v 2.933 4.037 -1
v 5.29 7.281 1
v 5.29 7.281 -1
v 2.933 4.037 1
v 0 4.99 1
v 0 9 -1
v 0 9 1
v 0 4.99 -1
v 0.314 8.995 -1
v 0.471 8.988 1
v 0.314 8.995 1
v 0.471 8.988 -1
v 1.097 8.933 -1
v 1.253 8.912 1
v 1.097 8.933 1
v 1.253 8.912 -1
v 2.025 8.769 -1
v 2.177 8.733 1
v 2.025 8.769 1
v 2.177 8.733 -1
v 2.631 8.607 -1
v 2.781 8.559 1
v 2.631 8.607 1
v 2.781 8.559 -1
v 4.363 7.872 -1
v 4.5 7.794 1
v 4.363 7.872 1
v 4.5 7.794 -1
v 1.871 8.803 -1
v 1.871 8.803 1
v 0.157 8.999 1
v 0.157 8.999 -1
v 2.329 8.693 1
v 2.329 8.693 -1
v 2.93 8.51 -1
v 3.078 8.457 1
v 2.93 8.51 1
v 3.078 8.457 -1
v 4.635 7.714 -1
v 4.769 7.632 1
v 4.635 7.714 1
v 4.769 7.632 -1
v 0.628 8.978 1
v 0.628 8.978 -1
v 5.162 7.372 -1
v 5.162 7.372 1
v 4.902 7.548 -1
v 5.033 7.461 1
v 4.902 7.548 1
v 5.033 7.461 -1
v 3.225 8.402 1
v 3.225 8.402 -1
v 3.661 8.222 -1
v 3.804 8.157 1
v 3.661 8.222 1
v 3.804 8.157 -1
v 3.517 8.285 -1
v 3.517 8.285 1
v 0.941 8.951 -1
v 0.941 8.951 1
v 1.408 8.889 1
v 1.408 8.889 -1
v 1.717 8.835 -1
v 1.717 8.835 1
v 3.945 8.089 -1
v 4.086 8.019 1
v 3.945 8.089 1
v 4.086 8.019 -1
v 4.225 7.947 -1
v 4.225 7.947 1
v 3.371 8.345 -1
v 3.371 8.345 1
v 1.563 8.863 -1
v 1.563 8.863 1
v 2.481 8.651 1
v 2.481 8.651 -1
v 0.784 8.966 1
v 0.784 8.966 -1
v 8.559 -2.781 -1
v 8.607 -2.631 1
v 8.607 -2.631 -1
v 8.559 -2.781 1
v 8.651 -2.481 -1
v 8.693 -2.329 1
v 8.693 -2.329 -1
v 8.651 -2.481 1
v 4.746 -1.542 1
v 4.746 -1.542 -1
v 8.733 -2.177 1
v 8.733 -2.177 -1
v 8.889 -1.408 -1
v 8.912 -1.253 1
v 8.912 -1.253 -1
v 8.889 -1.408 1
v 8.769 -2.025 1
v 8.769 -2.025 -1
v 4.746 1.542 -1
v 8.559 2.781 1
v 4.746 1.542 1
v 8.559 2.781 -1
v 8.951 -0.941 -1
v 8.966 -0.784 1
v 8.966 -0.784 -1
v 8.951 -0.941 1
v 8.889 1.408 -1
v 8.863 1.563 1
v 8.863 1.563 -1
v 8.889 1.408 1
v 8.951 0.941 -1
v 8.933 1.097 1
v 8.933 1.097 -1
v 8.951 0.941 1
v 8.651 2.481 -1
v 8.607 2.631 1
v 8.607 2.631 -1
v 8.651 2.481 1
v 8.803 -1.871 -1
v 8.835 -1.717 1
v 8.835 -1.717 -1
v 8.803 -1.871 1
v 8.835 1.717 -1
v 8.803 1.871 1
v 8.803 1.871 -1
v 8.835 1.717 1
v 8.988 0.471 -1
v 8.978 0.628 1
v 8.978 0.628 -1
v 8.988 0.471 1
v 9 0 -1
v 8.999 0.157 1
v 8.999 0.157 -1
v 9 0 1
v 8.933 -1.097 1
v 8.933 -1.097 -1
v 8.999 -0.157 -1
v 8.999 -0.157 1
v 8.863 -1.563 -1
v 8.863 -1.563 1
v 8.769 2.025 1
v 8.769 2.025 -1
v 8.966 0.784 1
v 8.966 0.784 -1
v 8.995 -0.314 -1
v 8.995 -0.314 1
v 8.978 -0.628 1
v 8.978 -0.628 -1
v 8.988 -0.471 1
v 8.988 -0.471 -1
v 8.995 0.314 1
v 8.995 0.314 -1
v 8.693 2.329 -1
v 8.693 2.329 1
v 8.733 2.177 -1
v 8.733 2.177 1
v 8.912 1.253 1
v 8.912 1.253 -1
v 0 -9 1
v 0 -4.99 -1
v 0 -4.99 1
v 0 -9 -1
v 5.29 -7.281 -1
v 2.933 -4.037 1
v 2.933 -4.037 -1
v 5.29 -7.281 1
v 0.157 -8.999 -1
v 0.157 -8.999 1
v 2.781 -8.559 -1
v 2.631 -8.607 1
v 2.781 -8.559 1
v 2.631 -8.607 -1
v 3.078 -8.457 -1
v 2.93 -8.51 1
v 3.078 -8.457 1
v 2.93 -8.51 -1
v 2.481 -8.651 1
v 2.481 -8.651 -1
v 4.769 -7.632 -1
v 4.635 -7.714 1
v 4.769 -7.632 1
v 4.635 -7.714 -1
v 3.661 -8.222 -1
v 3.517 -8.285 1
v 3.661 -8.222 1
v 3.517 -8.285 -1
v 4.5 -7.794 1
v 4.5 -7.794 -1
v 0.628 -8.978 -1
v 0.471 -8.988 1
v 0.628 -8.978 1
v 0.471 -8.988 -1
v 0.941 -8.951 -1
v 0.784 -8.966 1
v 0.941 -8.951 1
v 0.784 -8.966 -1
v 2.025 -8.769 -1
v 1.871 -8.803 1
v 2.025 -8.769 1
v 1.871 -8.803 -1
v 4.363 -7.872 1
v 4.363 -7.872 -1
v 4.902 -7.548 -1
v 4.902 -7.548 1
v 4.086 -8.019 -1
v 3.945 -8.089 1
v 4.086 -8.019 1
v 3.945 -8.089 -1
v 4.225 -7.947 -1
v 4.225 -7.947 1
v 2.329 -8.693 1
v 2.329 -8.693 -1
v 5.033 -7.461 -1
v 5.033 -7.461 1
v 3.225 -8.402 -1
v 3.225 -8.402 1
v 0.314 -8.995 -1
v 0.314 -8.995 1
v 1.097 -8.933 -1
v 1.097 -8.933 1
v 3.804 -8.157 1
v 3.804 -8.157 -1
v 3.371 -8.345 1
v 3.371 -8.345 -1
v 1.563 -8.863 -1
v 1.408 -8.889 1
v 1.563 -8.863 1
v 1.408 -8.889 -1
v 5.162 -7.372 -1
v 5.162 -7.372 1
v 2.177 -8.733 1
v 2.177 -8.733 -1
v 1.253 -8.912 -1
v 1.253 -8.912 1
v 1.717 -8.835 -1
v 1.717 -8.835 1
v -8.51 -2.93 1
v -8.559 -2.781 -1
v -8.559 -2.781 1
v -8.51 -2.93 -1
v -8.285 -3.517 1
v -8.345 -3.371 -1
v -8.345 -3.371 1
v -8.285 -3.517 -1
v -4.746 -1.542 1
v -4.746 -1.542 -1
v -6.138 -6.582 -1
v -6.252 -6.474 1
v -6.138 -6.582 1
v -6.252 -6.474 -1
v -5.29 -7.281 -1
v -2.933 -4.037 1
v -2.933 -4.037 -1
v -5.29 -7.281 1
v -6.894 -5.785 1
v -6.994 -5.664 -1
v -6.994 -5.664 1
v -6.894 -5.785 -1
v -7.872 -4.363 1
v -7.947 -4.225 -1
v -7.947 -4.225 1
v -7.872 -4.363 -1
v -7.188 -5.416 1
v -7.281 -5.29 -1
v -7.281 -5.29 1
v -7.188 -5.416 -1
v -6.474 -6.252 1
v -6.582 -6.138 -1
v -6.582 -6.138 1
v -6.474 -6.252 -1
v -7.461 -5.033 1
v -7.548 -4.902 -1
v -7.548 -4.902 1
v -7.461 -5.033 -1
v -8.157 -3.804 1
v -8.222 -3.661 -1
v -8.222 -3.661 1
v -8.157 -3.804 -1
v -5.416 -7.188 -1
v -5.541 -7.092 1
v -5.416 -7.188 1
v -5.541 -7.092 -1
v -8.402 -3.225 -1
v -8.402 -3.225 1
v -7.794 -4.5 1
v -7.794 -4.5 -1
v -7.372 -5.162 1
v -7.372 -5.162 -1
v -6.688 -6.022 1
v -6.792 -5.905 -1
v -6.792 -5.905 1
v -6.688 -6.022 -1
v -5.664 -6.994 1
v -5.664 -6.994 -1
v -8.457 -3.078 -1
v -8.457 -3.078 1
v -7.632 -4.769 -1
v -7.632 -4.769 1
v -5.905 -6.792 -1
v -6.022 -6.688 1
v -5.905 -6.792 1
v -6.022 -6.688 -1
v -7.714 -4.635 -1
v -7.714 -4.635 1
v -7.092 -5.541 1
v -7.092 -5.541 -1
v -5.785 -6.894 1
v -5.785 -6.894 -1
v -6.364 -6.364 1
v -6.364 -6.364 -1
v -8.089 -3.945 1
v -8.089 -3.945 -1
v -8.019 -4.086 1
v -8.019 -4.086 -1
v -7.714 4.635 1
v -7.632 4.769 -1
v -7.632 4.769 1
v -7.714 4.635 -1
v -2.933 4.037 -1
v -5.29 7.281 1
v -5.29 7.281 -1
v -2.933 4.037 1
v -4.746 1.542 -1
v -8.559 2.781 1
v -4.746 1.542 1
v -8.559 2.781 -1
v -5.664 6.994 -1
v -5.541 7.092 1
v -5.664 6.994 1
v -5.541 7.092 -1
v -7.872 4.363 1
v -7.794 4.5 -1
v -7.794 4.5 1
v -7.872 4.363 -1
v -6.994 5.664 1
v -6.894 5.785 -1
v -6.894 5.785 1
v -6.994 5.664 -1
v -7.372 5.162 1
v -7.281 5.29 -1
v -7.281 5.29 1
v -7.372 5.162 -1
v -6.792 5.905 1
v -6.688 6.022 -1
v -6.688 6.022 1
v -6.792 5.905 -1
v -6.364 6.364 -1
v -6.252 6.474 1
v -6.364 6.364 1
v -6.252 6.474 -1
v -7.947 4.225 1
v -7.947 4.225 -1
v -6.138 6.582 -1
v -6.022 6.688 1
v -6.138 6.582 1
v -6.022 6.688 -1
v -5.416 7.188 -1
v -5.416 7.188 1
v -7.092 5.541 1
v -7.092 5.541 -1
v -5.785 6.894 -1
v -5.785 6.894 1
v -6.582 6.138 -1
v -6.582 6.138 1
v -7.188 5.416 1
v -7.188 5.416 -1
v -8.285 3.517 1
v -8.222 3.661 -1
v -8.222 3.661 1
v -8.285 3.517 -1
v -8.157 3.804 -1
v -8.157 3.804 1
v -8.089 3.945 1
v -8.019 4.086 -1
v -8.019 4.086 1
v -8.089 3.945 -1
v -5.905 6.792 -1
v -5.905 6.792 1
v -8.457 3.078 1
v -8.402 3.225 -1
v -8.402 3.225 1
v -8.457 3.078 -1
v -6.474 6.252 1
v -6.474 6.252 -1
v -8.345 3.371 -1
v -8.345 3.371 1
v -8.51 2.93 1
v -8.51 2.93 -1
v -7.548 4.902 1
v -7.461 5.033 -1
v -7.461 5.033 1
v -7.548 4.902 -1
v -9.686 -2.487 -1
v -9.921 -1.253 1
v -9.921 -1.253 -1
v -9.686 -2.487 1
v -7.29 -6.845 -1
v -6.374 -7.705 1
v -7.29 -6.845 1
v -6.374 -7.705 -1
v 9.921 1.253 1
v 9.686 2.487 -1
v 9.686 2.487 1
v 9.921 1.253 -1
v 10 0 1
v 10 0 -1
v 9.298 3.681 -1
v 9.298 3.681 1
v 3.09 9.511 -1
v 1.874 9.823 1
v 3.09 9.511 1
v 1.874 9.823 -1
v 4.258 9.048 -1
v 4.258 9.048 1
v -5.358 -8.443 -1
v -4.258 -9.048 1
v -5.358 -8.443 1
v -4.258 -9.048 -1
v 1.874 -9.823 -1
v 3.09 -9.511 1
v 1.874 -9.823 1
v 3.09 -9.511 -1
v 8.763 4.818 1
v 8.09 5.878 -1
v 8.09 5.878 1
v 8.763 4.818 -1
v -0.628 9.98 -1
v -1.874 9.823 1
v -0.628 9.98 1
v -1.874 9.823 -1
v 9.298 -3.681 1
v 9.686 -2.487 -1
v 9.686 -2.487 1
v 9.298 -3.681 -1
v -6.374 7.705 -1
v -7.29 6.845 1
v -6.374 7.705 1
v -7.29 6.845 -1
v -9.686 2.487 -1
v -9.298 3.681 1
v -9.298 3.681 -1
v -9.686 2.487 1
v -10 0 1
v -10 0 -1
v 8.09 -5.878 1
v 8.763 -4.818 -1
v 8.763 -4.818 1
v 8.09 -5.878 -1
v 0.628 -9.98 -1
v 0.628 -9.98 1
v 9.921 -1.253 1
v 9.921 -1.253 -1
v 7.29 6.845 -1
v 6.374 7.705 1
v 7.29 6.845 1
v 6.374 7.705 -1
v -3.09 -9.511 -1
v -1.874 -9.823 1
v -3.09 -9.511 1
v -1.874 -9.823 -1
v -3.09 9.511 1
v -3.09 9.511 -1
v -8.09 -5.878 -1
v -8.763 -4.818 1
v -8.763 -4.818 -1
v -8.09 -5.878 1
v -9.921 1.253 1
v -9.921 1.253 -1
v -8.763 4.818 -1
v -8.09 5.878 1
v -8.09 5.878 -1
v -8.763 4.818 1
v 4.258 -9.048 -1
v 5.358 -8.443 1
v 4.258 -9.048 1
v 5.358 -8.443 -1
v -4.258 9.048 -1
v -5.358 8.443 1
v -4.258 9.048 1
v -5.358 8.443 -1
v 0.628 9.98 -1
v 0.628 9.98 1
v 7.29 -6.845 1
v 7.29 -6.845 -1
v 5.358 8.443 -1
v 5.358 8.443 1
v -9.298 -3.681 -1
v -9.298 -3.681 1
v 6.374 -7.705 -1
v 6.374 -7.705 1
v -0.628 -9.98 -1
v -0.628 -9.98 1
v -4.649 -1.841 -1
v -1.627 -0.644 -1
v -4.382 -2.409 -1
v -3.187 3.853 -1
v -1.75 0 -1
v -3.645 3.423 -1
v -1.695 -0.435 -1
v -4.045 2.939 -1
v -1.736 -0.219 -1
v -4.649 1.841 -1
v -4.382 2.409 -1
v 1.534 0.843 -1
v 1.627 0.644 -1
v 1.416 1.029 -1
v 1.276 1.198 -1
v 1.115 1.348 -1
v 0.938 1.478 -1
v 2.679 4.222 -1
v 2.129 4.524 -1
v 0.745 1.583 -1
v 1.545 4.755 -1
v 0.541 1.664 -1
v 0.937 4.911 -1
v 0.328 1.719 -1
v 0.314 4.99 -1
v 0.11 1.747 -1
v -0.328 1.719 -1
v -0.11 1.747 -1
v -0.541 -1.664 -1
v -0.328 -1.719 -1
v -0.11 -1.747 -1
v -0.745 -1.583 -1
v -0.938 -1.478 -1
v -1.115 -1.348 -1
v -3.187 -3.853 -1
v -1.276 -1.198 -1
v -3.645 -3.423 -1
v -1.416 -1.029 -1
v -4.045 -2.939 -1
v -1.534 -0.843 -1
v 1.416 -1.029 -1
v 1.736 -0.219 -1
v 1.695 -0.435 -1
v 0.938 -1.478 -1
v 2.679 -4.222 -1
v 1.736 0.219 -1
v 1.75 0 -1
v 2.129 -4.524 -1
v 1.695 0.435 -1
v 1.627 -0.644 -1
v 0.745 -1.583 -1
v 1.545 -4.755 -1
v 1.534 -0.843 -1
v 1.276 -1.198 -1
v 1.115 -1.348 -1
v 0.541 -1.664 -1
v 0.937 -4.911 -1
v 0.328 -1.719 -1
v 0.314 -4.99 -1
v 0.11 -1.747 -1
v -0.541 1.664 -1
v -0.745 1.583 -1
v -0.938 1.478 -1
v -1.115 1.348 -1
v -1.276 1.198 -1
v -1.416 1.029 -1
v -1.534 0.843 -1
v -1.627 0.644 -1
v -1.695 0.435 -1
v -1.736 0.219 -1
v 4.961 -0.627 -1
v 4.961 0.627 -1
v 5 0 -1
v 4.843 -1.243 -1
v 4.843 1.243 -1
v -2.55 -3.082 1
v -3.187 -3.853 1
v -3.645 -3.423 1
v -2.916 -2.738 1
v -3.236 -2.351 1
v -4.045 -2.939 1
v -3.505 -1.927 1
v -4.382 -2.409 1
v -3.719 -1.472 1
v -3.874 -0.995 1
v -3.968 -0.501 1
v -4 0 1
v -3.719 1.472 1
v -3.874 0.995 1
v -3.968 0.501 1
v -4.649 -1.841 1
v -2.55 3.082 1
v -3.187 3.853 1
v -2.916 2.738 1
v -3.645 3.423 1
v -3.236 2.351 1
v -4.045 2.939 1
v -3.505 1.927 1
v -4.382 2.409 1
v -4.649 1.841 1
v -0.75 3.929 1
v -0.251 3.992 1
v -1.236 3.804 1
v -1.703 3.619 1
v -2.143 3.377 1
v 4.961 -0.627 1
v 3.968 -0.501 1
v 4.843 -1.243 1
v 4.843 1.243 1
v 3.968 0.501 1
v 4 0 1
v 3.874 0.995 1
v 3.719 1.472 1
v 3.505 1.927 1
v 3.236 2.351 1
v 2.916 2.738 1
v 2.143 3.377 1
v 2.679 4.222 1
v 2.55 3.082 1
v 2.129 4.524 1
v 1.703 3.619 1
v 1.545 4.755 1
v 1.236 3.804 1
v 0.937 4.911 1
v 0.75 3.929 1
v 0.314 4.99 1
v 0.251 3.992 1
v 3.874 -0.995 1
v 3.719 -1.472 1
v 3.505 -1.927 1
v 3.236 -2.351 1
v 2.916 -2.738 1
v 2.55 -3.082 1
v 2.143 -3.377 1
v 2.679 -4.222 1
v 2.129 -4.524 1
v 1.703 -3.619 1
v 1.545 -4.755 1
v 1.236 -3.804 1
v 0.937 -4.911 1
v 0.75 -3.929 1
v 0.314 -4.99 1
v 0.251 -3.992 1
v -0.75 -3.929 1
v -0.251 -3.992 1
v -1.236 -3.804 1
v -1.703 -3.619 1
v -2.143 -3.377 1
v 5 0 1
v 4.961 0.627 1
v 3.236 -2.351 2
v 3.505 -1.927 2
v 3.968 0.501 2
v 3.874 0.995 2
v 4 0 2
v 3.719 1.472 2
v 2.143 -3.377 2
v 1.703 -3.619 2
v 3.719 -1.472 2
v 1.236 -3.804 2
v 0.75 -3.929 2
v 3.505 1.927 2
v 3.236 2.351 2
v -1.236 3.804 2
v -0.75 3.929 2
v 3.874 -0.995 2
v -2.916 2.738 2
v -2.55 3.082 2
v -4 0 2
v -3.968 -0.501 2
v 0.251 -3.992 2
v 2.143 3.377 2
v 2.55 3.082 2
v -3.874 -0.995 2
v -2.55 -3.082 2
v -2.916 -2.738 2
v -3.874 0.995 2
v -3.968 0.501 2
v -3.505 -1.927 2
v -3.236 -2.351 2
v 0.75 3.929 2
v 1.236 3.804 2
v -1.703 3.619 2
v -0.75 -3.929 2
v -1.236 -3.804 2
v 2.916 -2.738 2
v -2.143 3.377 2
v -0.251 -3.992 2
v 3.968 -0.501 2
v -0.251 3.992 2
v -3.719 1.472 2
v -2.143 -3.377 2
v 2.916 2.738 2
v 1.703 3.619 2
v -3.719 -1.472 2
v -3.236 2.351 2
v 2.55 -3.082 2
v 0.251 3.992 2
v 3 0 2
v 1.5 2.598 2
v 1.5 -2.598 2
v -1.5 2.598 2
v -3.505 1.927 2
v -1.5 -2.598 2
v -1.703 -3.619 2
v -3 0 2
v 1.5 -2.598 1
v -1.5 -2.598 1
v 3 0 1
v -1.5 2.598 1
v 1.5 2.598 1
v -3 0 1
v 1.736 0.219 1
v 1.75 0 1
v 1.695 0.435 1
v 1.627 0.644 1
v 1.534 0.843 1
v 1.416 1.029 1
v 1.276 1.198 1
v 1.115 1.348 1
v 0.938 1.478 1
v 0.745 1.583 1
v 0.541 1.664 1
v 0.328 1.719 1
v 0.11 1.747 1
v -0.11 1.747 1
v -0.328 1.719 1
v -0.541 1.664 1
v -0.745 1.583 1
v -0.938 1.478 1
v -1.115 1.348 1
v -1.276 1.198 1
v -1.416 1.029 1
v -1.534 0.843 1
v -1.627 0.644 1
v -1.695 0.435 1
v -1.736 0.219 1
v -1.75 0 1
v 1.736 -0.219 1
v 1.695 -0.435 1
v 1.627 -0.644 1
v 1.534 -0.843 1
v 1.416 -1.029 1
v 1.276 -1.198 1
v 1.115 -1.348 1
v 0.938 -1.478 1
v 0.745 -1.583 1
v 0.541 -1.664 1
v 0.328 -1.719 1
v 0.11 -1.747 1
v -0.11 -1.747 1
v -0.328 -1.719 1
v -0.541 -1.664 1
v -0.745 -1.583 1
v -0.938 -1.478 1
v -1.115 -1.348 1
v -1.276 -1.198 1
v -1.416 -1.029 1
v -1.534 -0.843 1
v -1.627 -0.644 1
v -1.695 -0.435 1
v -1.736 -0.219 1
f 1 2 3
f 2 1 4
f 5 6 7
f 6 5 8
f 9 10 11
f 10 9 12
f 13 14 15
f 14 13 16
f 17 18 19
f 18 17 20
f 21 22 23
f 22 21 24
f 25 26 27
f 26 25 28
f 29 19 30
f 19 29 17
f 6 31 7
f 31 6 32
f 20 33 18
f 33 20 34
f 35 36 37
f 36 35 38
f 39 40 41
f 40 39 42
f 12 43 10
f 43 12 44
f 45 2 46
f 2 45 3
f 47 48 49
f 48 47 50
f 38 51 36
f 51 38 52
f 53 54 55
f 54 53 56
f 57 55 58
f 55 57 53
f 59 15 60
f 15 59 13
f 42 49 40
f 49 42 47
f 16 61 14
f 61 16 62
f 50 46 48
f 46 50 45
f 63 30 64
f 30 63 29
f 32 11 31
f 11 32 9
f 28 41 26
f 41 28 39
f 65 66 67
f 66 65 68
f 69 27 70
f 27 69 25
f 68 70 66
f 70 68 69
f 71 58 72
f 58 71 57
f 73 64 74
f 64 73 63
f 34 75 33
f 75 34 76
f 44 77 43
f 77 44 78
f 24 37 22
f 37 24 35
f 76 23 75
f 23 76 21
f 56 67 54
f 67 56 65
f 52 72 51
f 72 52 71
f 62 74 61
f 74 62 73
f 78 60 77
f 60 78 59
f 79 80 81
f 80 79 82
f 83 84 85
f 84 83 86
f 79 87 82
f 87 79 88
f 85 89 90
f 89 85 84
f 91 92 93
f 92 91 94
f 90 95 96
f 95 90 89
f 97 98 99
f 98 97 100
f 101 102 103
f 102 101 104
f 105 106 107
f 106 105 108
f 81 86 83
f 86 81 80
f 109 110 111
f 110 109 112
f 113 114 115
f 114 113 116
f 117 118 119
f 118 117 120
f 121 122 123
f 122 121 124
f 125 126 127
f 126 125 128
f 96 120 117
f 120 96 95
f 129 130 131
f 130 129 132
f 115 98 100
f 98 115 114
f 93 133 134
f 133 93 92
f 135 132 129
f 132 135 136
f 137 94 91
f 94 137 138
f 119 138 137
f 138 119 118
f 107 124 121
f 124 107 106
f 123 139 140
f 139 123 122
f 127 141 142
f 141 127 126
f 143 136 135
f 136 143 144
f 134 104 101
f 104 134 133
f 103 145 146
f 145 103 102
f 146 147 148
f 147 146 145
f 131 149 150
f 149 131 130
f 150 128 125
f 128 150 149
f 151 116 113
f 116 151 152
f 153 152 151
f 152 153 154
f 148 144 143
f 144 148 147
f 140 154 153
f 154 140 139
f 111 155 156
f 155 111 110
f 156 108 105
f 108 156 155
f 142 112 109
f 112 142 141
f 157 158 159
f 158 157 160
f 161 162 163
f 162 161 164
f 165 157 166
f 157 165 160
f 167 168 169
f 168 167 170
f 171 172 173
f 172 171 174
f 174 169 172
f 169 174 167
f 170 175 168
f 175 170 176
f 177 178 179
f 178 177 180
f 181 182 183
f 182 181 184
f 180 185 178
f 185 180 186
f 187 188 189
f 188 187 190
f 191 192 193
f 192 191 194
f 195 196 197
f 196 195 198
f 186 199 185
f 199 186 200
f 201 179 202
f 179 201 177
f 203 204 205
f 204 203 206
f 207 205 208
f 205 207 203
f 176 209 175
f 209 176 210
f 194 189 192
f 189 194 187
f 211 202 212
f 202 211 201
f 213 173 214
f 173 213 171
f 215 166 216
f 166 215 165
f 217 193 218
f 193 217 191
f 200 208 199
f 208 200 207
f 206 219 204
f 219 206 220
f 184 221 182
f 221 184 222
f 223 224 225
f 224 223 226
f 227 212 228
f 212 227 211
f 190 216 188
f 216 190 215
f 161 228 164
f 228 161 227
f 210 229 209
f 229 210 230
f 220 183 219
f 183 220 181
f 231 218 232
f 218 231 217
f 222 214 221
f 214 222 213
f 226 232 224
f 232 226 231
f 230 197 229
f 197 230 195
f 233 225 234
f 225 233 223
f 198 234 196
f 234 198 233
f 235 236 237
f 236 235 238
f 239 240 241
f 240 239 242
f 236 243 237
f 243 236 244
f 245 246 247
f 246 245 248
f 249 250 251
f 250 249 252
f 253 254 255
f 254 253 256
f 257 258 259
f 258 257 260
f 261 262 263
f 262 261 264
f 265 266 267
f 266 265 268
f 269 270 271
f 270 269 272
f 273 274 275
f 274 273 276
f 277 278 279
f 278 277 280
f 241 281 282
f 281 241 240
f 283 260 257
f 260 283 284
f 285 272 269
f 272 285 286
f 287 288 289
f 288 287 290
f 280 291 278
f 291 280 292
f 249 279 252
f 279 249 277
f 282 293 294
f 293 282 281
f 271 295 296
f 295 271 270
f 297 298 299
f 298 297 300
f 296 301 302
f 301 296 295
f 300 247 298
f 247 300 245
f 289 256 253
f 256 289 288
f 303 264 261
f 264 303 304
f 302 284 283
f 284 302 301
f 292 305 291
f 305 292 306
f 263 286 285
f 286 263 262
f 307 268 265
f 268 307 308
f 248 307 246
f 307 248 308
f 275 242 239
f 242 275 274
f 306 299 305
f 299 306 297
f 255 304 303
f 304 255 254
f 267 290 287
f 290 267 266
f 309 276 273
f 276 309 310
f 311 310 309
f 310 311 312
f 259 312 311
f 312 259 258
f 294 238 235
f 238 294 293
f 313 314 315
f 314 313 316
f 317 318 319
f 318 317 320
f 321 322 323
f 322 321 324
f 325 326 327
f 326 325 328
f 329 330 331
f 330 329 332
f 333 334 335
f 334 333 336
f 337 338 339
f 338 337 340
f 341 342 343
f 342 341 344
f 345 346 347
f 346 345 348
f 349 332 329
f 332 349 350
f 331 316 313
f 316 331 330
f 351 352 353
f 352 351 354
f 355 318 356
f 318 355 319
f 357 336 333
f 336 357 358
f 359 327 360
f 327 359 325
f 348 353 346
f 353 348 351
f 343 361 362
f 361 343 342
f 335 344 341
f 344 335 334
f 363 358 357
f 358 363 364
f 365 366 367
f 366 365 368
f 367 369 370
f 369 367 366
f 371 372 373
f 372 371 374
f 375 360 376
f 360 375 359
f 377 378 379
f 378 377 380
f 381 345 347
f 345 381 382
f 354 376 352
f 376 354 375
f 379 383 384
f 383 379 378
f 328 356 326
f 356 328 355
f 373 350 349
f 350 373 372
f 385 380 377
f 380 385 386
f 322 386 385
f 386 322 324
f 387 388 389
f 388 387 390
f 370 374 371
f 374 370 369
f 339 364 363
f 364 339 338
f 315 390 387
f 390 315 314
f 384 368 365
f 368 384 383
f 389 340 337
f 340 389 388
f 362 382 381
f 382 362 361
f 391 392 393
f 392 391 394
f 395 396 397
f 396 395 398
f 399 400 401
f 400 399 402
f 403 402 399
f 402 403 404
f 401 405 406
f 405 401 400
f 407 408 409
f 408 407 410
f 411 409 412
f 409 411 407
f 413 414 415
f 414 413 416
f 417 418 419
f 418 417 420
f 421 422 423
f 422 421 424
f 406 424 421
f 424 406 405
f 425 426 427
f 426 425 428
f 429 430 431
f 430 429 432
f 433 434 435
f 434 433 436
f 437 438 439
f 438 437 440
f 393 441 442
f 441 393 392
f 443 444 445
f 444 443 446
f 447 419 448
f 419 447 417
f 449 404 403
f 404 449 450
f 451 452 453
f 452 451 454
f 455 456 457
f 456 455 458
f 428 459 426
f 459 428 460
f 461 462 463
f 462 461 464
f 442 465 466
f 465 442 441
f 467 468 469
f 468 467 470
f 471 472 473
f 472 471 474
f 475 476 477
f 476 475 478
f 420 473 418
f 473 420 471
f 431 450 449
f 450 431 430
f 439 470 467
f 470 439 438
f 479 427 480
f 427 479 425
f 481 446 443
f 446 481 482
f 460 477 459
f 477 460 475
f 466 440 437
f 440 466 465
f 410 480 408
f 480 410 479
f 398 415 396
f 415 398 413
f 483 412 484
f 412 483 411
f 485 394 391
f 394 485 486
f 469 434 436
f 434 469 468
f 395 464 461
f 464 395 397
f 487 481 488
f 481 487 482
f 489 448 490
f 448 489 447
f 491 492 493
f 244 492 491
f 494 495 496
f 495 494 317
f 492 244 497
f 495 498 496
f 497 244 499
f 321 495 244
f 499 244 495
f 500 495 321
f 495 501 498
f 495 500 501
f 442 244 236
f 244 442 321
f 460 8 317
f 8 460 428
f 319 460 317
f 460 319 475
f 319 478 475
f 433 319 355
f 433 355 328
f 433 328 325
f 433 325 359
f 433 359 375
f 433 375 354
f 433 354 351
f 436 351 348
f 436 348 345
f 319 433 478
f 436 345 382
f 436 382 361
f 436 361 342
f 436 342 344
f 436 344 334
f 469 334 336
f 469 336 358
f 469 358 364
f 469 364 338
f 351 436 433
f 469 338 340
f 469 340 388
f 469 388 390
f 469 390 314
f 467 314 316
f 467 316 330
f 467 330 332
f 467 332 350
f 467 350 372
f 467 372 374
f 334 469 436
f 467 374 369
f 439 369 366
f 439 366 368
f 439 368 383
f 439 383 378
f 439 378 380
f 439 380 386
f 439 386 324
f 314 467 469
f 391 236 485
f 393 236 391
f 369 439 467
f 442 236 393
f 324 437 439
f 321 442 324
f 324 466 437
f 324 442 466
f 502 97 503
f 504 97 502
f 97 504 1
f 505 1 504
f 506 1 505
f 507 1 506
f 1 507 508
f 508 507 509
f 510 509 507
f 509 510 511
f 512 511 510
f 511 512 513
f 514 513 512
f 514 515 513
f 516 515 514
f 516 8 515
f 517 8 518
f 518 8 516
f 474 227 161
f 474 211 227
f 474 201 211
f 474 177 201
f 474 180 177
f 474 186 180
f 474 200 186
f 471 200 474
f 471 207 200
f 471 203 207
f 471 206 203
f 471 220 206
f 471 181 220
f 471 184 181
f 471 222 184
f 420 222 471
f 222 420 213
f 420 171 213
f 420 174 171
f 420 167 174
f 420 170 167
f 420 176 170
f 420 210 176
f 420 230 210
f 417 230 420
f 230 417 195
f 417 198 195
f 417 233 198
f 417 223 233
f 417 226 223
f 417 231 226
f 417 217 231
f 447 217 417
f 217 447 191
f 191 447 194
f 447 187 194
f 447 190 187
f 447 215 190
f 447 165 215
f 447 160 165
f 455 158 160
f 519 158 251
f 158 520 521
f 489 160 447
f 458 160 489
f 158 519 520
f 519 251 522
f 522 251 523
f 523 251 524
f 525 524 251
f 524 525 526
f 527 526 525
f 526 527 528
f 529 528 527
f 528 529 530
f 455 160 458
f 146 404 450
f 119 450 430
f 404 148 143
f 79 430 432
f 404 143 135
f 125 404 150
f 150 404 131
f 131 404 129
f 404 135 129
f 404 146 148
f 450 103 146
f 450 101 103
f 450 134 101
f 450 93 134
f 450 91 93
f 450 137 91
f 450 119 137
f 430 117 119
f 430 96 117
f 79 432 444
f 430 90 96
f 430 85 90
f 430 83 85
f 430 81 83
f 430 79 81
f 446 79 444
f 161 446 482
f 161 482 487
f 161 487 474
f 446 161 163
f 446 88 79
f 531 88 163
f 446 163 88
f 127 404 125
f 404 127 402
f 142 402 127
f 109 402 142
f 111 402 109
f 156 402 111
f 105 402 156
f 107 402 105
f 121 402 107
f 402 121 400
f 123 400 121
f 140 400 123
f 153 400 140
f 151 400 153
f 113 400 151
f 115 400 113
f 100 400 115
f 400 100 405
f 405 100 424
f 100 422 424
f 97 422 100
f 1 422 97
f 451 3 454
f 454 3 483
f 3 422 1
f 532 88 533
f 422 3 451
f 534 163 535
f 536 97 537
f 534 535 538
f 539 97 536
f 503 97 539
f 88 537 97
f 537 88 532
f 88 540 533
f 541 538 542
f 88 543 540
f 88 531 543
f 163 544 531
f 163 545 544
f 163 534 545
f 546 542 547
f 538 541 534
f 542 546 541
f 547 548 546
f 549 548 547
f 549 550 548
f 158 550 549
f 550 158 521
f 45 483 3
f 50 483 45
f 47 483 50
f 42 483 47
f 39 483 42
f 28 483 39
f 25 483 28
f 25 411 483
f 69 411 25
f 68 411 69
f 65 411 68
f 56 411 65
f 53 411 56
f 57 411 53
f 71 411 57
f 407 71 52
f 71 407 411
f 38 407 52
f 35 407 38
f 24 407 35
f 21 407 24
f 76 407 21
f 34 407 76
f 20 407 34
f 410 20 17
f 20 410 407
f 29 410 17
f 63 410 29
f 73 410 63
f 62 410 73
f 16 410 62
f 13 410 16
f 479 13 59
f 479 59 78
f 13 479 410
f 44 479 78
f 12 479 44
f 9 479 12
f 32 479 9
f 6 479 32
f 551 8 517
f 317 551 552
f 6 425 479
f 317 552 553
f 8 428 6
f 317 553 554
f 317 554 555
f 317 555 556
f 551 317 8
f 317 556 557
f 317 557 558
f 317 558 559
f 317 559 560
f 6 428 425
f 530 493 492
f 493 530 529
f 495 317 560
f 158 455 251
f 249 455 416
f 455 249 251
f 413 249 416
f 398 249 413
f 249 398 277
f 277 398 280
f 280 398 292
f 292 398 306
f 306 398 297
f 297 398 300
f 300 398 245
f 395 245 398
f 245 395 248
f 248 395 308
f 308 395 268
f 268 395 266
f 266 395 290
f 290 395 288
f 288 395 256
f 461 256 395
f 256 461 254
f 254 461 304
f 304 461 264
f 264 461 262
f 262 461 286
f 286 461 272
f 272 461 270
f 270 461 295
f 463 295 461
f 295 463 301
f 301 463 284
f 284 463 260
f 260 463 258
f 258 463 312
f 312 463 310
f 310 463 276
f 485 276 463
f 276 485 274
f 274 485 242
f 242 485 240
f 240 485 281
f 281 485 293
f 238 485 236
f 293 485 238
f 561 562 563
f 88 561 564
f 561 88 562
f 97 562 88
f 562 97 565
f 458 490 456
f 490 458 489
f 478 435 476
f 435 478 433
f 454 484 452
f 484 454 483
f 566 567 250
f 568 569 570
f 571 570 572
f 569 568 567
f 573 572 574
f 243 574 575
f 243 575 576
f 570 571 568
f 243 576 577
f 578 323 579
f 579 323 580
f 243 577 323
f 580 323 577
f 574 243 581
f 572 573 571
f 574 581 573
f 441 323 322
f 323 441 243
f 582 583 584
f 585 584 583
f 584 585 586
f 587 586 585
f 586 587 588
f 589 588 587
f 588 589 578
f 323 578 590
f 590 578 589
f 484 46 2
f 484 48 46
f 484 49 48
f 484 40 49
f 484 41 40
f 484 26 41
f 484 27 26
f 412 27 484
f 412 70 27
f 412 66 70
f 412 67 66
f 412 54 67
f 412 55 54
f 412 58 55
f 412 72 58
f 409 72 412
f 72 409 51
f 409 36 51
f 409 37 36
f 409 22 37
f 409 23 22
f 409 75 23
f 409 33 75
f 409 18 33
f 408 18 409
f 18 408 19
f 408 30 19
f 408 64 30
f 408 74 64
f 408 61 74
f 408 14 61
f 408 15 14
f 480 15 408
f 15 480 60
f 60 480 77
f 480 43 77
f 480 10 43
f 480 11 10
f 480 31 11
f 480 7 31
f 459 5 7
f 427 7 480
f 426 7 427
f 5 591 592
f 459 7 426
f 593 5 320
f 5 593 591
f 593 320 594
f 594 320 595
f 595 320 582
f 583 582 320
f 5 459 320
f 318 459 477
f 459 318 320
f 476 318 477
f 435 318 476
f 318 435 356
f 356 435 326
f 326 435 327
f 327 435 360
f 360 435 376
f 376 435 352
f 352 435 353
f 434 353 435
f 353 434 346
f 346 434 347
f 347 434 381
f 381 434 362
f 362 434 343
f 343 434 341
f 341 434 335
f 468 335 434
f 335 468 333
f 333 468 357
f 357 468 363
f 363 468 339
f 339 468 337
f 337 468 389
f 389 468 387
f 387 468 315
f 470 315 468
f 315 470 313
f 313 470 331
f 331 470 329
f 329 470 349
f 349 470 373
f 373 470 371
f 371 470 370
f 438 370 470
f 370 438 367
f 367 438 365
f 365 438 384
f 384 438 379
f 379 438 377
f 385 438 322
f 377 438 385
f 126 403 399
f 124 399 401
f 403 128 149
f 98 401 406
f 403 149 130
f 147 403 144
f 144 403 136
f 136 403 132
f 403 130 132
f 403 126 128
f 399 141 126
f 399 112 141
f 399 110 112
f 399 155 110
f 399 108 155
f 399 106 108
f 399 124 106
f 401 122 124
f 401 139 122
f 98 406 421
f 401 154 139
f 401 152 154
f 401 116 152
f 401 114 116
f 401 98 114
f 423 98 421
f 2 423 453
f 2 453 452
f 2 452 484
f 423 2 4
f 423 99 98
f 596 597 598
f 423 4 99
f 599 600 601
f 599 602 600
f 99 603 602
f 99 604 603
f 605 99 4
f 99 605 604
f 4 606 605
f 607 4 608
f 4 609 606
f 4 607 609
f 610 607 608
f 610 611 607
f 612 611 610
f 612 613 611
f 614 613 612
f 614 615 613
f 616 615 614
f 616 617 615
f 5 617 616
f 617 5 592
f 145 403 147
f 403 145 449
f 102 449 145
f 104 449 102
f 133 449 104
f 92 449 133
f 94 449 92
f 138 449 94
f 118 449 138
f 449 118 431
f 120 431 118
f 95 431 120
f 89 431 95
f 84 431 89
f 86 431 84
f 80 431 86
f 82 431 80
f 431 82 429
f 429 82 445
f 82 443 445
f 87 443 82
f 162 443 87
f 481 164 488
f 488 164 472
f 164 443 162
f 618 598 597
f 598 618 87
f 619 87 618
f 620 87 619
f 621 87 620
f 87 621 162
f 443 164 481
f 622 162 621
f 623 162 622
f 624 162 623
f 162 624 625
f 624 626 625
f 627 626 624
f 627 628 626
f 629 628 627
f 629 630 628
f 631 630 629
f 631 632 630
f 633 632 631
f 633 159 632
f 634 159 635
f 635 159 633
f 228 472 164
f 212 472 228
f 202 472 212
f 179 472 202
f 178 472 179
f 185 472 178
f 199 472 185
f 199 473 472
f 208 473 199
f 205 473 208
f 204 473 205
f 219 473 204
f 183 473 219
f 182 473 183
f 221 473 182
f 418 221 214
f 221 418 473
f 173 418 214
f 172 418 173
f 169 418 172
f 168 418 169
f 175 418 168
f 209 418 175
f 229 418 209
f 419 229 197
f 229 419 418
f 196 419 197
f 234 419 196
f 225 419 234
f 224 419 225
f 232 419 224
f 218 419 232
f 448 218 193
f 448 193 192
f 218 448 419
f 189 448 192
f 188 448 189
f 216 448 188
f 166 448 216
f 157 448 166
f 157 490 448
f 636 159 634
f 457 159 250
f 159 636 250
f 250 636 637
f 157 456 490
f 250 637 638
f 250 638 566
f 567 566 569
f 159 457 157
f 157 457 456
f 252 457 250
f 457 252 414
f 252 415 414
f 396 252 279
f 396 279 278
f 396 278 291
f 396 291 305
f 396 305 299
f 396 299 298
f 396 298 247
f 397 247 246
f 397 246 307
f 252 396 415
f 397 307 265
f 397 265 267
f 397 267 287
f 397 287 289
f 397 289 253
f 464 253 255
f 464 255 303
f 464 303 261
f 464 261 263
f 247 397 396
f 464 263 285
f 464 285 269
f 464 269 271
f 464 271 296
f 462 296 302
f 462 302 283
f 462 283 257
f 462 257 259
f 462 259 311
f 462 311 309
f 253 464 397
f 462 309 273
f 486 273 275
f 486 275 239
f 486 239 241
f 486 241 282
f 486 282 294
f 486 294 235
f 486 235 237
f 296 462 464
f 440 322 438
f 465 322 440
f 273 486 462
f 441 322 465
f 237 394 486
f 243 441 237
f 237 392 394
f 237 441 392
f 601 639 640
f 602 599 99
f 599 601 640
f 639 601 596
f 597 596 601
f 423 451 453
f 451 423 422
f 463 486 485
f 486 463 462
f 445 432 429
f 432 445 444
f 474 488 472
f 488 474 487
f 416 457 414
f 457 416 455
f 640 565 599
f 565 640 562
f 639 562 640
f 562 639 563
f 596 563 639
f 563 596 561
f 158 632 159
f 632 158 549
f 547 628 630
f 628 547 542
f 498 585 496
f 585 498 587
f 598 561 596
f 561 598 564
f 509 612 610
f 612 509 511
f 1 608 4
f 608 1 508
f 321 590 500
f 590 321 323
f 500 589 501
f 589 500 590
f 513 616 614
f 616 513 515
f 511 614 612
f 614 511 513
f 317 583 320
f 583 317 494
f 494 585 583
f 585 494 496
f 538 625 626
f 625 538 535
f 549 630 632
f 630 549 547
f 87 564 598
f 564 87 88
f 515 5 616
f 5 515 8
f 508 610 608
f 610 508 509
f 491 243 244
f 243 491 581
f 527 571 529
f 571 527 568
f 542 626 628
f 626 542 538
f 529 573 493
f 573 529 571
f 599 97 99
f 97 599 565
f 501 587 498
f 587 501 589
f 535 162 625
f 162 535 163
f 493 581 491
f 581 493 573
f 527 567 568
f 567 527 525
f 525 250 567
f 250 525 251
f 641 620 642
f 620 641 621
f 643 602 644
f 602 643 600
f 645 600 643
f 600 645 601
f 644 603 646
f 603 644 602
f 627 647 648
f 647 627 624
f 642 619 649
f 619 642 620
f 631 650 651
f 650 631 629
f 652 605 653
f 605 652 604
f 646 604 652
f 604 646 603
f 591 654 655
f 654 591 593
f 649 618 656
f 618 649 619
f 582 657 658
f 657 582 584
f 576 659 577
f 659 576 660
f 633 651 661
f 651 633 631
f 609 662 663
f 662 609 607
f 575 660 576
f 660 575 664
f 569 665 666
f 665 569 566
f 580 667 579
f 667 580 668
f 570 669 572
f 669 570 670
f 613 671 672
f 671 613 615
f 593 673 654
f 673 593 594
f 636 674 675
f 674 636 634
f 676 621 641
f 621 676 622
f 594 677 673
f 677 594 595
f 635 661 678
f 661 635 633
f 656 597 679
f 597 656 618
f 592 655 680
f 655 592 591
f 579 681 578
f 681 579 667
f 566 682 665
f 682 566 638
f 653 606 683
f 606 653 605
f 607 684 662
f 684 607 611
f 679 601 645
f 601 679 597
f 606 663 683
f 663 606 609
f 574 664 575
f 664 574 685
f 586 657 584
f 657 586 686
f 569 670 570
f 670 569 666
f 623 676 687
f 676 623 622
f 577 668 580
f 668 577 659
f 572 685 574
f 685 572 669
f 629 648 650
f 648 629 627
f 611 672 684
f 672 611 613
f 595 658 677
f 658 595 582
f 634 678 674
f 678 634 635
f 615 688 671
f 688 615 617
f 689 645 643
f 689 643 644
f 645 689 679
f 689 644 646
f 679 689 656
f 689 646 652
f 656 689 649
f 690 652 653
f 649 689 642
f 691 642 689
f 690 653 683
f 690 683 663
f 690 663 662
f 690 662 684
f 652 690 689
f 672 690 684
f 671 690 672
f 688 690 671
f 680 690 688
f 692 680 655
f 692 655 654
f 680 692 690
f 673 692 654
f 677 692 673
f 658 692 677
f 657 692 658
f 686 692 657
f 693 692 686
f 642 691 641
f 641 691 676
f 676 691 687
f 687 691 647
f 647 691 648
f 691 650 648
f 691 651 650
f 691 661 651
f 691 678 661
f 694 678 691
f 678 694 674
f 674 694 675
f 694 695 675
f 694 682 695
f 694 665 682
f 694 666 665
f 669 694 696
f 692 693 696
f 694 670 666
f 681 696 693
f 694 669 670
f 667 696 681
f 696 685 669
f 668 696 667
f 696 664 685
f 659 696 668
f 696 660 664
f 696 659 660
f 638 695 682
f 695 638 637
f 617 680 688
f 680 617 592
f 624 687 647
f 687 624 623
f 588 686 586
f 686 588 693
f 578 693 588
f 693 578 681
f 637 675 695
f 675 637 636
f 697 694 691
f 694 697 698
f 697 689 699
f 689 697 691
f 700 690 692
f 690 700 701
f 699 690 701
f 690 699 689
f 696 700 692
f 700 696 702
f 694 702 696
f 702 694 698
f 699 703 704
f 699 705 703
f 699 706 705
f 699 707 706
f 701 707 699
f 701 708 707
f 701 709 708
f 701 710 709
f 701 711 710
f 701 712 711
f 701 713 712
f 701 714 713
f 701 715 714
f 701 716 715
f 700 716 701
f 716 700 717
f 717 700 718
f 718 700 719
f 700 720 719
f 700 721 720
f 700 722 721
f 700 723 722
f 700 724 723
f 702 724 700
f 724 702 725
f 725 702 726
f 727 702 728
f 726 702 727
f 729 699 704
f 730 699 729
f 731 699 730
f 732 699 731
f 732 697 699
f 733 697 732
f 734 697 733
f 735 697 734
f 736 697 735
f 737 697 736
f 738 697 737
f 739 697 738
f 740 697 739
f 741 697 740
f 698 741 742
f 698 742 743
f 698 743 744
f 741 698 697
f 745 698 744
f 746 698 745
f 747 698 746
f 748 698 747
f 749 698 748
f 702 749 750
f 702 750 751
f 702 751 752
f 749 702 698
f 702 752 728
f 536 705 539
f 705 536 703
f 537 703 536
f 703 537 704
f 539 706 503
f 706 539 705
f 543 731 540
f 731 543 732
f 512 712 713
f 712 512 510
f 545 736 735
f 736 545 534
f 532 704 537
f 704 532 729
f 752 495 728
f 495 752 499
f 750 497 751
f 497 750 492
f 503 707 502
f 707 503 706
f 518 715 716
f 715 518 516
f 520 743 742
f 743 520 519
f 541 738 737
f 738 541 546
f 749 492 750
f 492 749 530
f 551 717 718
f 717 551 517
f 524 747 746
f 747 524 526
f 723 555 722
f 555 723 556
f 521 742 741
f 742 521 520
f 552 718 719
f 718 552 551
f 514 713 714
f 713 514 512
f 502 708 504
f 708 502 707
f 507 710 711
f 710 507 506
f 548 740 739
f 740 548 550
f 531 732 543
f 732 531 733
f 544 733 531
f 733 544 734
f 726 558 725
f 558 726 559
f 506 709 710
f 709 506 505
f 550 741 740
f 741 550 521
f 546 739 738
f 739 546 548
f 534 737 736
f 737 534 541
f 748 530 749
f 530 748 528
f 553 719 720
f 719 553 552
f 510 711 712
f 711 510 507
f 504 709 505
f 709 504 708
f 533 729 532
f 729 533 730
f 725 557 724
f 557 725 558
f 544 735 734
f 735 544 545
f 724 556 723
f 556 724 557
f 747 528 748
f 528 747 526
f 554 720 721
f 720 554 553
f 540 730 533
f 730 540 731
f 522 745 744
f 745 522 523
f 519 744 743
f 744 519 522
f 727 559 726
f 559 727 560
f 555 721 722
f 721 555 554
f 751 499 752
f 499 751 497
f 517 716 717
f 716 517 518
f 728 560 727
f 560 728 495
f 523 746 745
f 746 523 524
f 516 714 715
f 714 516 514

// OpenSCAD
/* 
 * Parametric Encoder Wheel 
 *
 * by Rafael Estevam, November 2015
 * http://www.RafaelEstevam.Net
 * 
 * Licenced under Creative Commons Public Domain
*/

ExternalRadius = 10;
WallTickness = 1;
InnerRadius = 5;
TeethCount = 5;
WheelHeight = 2;
CenterHoleRadius = 1.75;
CenterHoleExagonal = "No"; // [No,Yes]
CenterSupportRadius = 4;
CenterSupportHeight = 2;
CenterSupportHoleRadius = 3;
CenterSupportHoleExagonal = "Yes"; // [No,Yes]

/* [HIDDEN] */
$fn=50;

difference(){
    union(){
        Wheel(ExternalRadius,WallTickness,
              InnerRadius,TeethCount,WheelHeight);
        cylinder(h=CenterSupportHeight,
                 r=CenterSupportRadius);
    }
    translate([0,0,WheelHeight/2])
        cylinder(h=(WheelHeight+CenterSupportHeight)*2,
                 r=CenterSupportHoleRadius,
                 $fn=CenterSupportHoleExagonal == "No" ? 50:6);
    translate([0,0,-WheelHeight+0.01])
        cylinder(h=WheelHeight*2,
                 r=CenterHoleRadius,
                 $fn=CenterHoleExagonal == "No" ? 50:6);
}


module Wheel(ExtRadius,Wall,InnerRadius,TeehCount,Height){
    cylinder(r=InnerRadius,h=Height,center=true);
    difference(){
        cylinder(r=ExtRadius,h=Height,center=true);
        for(a = [0:2:TeehCount*2]){
            stepAngle = 360.0 / (TeehCount*2);
            3DArc(Height+1,a*stepAngle,
                  (a+1)*stepAngle,
                  ExtRadius-Wall);
            
        }
    }
}
module 3DArc(Height,StartAngle,EndAngle,Radius){
    linear_extrude(height=Height,center=true)
    2DArc(StartAngle,EndAngle,Radius);
}
module 2DArc(StartAngle,EndAngle,Radius){
    points = [ 
        for (a = [StartAngle : EndAngle]) 
            Radius * [ sin(a), cos(a) ] ];
    polygon(concat(points, [[0, 0]]));
}
